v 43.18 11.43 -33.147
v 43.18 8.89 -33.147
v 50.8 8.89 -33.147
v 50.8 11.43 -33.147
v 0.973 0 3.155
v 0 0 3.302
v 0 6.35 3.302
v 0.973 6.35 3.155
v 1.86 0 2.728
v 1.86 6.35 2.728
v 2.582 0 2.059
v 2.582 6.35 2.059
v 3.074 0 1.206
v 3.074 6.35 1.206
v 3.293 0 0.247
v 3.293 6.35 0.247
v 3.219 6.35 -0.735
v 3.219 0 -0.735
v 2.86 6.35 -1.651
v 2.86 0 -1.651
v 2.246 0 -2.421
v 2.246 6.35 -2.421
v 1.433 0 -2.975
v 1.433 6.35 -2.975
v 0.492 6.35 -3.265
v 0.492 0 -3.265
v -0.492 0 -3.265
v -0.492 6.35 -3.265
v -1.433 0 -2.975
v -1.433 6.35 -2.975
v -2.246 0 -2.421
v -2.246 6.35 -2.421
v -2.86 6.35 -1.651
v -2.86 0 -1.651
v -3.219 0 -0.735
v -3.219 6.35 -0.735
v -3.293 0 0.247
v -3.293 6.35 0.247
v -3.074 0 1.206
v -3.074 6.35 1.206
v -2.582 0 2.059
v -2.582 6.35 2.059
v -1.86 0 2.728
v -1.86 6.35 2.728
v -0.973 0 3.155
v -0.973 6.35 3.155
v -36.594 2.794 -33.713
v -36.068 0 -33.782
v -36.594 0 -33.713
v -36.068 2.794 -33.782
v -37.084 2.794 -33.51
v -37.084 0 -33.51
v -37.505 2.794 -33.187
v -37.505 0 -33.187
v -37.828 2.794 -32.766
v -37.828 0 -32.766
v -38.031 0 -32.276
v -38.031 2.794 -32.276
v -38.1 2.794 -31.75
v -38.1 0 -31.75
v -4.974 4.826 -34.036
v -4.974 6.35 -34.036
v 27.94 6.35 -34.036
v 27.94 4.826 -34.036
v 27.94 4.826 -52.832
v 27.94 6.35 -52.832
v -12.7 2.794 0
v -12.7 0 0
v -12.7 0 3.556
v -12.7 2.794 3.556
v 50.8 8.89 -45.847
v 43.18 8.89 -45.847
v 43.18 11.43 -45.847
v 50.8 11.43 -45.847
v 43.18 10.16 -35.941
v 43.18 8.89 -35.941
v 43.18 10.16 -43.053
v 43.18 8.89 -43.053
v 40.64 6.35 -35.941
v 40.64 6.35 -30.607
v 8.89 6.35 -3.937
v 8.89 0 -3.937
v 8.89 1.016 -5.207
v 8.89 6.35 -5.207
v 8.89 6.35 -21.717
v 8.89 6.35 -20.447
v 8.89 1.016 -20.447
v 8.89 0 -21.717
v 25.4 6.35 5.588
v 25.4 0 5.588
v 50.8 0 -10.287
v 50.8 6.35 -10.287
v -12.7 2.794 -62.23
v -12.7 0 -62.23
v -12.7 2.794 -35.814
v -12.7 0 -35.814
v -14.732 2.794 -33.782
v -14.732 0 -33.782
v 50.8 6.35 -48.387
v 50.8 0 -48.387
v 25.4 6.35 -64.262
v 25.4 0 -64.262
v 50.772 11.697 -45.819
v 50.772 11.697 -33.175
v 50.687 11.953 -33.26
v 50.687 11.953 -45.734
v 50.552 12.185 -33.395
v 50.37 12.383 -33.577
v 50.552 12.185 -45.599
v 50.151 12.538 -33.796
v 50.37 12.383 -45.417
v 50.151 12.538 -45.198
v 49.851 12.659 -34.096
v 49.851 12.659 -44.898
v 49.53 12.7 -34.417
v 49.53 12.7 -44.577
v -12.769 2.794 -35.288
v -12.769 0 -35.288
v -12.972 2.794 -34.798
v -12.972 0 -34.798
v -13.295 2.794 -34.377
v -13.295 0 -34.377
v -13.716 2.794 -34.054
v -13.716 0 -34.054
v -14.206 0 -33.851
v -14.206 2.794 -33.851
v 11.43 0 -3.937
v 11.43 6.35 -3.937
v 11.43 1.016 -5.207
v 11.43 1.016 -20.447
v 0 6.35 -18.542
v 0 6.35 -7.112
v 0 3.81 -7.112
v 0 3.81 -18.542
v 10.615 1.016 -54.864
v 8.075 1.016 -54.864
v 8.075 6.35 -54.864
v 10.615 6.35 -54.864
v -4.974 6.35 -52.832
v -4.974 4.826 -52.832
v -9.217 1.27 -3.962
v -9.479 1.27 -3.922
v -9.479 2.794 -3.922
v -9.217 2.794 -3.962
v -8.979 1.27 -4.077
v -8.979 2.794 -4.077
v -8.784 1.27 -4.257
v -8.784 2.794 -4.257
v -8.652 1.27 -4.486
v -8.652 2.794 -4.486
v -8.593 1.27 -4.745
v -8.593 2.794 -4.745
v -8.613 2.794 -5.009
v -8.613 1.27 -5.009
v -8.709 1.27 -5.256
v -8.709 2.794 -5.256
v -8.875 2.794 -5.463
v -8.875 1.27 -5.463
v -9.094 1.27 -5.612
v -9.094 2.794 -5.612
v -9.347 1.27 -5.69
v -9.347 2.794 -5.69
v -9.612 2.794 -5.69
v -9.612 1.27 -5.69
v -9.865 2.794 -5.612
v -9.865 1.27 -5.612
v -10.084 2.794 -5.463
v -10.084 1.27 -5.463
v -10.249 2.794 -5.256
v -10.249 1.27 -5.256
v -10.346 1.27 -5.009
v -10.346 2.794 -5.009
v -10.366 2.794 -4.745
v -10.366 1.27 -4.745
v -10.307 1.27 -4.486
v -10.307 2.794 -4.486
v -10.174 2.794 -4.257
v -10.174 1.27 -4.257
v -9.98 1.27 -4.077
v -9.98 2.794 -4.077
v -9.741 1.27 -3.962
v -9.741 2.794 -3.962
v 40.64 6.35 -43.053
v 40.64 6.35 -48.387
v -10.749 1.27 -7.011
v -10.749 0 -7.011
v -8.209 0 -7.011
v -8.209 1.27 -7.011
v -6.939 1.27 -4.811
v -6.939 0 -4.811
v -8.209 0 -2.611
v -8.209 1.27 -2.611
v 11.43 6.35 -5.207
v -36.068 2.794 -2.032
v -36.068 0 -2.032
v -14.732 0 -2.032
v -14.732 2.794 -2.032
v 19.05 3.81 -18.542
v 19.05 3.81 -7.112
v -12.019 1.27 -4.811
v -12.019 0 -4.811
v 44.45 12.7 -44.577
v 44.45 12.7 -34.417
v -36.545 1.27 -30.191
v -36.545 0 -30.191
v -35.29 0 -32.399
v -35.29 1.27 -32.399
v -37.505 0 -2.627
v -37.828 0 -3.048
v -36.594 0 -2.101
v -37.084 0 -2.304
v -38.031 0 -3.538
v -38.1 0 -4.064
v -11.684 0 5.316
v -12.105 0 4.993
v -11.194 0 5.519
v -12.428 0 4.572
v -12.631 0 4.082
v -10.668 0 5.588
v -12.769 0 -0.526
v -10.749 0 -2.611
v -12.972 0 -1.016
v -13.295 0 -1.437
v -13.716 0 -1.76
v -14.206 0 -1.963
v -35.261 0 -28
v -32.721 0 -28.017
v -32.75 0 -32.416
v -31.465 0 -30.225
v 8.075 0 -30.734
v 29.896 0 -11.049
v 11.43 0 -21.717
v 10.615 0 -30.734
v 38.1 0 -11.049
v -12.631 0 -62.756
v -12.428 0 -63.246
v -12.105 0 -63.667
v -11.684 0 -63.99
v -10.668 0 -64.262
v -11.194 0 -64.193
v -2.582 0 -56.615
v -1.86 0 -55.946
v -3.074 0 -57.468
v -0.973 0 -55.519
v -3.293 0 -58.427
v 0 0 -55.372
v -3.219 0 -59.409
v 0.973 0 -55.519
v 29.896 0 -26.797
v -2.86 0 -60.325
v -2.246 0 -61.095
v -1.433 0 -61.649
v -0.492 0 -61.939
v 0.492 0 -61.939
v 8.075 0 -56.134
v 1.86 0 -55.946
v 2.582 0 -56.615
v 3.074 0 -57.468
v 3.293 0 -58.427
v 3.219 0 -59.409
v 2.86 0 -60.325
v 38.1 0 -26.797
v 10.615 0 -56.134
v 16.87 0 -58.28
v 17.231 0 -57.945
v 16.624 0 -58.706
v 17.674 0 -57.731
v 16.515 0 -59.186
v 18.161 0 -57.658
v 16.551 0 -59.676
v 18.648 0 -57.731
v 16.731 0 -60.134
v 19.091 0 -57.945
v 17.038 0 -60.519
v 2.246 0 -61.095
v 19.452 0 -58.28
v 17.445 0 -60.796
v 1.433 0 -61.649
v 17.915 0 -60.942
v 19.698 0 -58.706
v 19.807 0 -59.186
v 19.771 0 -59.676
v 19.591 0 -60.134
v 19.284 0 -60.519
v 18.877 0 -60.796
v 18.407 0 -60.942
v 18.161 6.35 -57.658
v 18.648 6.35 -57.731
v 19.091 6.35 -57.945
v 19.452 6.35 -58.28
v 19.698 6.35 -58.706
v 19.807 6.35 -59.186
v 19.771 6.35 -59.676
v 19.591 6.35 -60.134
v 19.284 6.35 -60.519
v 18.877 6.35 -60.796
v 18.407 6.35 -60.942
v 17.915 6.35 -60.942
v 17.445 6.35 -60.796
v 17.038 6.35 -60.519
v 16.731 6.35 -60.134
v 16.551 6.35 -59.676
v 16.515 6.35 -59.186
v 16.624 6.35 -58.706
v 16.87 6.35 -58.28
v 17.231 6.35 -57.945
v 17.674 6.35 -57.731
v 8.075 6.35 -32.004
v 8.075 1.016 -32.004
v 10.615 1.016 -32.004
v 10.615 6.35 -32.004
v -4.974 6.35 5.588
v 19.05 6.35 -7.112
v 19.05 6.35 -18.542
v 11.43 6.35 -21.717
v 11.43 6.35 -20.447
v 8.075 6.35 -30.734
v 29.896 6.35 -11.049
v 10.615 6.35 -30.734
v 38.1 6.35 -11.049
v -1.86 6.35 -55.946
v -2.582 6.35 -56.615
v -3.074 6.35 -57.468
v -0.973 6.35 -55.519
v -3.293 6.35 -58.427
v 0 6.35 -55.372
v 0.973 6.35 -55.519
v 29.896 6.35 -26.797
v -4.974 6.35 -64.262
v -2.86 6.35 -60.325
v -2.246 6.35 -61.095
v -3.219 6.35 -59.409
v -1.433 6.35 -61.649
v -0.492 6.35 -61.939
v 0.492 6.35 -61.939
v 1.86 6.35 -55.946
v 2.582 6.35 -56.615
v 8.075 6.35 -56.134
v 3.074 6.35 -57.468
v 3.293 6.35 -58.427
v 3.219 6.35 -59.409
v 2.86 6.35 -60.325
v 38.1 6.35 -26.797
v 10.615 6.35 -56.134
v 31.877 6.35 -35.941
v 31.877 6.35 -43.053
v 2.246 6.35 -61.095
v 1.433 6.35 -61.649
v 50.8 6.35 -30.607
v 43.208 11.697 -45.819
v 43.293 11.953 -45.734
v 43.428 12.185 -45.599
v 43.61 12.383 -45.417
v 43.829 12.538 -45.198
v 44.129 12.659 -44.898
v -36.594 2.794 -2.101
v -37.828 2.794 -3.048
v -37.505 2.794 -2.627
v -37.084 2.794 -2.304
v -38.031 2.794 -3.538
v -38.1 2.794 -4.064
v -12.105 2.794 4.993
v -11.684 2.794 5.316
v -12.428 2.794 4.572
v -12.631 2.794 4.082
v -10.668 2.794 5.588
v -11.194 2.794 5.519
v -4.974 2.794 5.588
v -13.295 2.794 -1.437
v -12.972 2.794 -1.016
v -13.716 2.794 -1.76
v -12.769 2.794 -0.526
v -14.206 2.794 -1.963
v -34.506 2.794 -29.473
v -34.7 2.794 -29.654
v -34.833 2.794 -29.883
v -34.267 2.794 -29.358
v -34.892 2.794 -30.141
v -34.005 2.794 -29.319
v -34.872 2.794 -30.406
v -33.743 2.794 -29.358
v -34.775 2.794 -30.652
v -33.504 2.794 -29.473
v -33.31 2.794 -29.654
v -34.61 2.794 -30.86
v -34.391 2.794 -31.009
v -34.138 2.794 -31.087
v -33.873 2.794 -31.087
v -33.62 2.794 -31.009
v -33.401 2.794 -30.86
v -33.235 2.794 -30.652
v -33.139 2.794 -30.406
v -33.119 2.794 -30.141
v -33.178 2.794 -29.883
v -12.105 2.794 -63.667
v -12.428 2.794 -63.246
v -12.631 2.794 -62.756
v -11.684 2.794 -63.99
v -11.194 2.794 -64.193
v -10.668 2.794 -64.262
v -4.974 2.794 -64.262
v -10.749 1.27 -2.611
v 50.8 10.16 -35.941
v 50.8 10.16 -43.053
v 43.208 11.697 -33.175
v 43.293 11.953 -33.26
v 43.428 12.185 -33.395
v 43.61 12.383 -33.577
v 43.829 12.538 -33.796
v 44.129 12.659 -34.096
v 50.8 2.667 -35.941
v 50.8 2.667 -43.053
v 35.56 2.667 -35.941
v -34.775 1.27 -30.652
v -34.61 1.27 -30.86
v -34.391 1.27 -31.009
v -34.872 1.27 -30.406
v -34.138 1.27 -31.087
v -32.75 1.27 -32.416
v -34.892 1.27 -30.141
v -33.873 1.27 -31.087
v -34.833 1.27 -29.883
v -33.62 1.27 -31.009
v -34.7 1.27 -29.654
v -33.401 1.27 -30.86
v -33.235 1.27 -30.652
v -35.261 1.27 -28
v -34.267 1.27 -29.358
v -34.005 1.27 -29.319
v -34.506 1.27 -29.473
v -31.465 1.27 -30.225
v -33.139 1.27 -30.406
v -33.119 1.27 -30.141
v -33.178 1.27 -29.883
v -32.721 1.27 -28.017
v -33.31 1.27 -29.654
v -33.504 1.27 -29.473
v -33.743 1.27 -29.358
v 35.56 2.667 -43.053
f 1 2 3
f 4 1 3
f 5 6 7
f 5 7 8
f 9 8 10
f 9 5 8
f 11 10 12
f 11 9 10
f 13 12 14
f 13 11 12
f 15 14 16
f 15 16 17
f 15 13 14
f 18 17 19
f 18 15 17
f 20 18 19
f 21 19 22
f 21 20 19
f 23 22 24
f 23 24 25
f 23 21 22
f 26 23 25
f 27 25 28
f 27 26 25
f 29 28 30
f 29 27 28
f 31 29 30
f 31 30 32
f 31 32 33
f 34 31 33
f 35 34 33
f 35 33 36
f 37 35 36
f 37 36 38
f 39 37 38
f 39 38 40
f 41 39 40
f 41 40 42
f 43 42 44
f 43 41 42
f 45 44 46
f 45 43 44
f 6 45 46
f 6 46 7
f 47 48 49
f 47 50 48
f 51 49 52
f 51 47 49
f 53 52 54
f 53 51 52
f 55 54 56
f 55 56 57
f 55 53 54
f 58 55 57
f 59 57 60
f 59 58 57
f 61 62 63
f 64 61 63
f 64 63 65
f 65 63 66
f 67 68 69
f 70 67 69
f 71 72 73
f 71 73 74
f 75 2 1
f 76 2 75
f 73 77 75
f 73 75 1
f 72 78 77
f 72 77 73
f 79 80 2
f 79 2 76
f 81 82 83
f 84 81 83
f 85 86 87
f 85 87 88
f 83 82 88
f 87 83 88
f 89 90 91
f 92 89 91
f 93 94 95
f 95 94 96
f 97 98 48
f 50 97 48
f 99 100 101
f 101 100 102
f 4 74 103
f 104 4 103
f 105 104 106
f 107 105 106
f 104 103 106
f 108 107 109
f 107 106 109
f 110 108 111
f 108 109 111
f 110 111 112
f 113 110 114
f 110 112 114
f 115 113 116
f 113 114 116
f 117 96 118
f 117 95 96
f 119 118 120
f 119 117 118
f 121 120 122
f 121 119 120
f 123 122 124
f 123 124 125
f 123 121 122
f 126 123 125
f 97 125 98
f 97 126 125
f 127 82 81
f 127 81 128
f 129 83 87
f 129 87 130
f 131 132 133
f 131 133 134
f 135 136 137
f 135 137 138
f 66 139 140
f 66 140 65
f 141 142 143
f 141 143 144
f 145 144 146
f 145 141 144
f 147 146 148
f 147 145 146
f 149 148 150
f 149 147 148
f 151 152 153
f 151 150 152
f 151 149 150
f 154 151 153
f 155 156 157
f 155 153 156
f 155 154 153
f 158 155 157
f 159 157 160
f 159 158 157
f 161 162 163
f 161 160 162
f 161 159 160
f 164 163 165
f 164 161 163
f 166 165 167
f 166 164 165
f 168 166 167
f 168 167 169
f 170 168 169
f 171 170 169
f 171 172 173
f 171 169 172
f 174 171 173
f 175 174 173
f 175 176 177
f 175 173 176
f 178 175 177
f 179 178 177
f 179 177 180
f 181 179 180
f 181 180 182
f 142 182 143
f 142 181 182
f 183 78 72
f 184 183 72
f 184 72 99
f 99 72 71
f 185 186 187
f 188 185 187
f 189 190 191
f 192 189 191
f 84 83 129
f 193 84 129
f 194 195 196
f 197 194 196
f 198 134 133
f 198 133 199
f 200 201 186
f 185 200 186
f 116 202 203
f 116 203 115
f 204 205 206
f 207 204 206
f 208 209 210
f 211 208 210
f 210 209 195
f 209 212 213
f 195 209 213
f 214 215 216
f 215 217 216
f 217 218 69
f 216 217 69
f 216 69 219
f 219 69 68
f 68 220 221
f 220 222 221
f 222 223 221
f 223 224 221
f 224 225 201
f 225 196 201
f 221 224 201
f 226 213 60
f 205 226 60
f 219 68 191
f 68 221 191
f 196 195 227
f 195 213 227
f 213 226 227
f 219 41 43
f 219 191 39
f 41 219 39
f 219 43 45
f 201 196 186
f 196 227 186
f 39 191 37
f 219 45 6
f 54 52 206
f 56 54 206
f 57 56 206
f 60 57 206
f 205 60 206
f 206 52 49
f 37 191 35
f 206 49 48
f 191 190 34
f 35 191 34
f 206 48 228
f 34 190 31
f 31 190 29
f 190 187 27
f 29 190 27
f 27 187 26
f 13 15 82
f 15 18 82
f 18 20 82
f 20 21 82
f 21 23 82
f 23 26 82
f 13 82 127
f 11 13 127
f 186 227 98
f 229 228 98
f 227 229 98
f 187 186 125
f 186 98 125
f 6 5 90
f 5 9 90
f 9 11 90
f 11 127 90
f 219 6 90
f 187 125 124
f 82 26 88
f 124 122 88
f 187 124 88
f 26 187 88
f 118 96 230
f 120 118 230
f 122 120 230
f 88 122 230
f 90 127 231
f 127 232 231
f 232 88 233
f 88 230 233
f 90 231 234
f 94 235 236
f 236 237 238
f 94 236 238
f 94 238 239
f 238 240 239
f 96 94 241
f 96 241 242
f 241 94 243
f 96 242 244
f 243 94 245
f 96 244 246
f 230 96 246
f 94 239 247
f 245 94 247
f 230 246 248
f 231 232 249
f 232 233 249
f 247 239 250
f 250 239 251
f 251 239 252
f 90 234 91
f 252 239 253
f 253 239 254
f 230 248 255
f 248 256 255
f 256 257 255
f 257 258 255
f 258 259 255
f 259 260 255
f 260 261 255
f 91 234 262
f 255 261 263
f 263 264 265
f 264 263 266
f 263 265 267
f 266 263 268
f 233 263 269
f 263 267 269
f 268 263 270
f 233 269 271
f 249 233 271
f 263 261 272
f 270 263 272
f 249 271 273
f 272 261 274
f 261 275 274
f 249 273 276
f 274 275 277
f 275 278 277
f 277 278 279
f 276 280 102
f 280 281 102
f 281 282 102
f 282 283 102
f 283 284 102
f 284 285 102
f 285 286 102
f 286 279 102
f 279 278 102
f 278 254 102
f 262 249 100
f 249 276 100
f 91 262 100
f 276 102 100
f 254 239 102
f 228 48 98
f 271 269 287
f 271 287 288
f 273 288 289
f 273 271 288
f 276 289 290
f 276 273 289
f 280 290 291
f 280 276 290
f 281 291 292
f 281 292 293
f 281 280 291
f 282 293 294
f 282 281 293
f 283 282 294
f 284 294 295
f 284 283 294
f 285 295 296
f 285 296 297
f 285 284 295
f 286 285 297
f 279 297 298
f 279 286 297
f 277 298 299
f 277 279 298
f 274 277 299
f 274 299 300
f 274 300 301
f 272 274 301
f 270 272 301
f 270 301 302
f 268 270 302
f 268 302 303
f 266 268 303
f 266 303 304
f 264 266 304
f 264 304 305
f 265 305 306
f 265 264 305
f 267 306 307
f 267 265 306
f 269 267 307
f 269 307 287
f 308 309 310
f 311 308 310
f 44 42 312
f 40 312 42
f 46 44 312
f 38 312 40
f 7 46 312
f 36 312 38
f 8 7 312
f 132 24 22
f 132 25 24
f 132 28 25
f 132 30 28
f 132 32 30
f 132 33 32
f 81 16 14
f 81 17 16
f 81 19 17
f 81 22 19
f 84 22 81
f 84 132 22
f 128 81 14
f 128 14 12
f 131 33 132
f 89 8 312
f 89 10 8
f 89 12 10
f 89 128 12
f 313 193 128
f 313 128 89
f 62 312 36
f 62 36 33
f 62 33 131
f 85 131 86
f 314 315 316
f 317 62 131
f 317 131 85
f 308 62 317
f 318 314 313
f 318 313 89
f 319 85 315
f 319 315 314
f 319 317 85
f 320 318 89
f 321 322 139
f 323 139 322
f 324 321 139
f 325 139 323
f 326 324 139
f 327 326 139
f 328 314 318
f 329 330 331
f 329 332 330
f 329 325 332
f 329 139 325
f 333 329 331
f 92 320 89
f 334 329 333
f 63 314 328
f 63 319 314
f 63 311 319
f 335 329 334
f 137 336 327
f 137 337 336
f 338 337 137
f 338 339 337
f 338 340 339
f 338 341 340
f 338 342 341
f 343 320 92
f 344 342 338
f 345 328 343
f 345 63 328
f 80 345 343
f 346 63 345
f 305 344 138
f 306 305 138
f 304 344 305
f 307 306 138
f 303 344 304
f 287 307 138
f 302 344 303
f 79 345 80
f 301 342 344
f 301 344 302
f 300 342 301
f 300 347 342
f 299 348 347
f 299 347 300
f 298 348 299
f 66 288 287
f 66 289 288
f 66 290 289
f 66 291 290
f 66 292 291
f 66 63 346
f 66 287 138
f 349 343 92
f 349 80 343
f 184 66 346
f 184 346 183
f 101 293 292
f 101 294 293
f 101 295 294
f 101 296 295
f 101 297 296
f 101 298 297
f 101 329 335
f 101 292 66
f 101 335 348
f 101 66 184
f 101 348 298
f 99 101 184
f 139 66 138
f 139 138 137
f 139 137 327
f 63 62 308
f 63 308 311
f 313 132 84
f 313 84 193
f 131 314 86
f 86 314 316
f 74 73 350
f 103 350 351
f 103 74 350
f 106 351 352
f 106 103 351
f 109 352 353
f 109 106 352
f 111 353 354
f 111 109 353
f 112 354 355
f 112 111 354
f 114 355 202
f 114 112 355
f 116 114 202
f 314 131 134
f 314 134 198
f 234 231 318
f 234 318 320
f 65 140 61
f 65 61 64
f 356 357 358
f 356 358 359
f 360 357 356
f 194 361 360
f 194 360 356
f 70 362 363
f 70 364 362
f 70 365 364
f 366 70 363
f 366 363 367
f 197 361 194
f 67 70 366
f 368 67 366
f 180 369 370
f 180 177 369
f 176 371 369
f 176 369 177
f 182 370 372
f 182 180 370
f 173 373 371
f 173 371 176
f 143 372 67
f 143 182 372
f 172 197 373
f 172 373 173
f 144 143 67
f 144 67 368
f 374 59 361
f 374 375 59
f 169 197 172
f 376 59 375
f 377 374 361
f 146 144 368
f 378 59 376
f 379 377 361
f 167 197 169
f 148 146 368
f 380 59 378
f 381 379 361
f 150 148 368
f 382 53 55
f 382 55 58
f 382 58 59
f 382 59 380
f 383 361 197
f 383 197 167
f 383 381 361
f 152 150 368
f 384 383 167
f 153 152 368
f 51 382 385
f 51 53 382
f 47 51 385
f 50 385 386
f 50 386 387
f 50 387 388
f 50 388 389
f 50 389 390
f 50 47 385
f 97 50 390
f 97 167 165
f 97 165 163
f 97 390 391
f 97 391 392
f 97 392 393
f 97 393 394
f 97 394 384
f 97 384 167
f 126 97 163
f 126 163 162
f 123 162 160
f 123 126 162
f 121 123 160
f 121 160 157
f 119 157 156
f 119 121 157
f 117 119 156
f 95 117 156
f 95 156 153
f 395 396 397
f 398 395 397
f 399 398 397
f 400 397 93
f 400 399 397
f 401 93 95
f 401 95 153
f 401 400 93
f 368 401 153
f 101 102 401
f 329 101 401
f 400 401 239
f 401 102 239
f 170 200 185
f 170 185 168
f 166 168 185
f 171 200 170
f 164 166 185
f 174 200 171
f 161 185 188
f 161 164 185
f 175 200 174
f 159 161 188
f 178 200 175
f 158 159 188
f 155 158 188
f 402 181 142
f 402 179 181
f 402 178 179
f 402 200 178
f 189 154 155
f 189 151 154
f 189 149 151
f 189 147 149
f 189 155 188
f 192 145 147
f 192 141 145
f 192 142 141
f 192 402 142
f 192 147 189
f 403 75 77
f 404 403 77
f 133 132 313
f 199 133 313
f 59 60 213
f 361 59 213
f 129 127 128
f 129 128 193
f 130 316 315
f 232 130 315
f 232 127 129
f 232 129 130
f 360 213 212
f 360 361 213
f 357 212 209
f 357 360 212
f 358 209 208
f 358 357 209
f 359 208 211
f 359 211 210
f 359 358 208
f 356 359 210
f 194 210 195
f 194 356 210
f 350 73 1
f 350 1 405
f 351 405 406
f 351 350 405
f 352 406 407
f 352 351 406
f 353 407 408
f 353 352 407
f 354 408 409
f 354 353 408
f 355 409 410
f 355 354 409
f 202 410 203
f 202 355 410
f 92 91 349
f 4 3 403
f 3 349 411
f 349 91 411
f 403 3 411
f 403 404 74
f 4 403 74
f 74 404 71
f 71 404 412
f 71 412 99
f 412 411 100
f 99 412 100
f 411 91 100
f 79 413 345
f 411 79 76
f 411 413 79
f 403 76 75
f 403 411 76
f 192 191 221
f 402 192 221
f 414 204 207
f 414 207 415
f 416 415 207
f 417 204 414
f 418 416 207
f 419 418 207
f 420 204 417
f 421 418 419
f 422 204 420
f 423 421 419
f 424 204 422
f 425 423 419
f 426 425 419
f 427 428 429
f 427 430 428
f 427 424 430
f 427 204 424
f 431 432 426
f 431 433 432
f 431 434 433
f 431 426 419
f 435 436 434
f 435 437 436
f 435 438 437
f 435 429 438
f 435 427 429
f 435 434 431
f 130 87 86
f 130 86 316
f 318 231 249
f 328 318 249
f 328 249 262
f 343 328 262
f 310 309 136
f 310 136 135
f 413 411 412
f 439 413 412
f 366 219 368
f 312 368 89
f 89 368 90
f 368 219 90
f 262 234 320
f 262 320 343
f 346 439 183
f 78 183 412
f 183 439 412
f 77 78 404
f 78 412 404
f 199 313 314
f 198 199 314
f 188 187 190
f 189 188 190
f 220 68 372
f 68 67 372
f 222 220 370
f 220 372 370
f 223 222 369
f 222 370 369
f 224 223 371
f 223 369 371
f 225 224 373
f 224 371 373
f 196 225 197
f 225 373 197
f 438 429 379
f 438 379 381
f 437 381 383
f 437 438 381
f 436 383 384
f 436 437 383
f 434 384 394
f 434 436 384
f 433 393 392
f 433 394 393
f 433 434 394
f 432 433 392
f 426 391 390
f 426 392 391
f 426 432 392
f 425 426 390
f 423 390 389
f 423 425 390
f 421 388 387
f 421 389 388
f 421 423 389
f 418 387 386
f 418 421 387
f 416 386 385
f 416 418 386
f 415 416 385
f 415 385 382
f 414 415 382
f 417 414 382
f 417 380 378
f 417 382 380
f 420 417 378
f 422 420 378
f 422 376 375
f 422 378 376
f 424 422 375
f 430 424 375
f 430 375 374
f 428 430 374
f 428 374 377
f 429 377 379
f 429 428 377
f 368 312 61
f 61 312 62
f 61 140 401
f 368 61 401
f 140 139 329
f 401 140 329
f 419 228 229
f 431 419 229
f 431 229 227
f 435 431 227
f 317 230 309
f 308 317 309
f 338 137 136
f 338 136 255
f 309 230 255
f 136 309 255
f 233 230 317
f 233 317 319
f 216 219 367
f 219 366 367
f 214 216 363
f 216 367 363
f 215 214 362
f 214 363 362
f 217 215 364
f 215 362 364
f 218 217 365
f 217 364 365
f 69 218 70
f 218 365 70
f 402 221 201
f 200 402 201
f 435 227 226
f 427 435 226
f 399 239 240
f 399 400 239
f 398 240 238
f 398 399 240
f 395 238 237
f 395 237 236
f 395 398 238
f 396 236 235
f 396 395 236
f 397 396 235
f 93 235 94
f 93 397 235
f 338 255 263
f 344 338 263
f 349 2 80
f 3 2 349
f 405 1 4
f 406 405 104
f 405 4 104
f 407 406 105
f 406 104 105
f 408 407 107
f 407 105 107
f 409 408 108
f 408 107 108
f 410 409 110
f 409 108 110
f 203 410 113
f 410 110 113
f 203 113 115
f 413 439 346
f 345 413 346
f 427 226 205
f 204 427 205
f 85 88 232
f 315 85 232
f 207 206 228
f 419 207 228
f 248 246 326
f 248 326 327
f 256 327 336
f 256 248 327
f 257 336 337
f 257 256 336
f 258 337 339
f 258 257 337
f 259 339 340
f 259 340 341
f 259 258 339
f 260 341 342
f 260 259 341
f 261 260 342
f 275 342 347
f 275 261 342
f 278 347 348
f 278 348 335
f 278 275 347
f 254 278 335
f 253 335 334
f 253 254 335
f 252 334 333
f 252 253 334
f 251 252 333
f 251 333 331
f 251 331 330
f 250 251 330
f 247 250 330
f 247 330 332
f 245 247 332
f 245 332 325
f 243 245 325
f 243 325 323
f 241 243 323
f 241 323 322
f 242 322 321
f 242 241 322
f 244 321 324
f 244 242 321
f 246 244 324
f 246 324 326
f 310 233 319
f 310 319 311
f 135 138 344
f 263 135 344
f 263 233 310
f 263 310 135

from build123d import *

# Parameters (mm, degrees)
SKETCH1_R               = 1.651
SKETCH1_R_2             = 3.302
SKETCH1_R_3             = 0.889
SKETCH1_W               = 8.2042
SKETCH1_H               = 15.748
BOSS_EXTRUDE1_DEPTH     = 6.35
SKETCH2_W               = 19.05
SKETCH2_H               = 11.43
CUT_EXTRUDE1_DEPTH      = 2.54
CUT_EXTRUDE2_DEPTH      = 83.161835082
CUT_EXTRUDE2_DEPTH_BACK = 83.161835082
SKETCH5_W               = 2.54
SKETCH5_H               = 1.27
SKETCH6_W               = 2.54
SKETCH6_H               = 15.24
CUT_EXTRUDE3_DEPTH      = 1.016
SKETCH7_W               = 40.64
SKETCH7_H               = 18.796
CUT_EXTRUDE4_DEPTH      = 1.524
CUT_EXTRUDE5_DEPTH      = 83.161835082
CUT_EXTRUDE5_DEPTH_BACK = 83.161835082
SKETCH8_W               = 2.54
SKETCH8_H               = 1.27
SKETCH10_W              = 2.54
SKETCH10_H              = 22.86
CUT_EXTRUDE6_DEPTH      = 1.016
SKETCH11_W              = 7.62
SKETCH11_H              = 12.7
BOSS_EXTRUDE2_DEPTH     = 6.35
SKETCH13_W              = 7.112
SKETCH13_H              = 7.493
CUT_EXTRUDE7_DEPTH      = 19.05
CHAMFER3_SIZE           = 2.54
FILLET1_R               = 1.27
CHAMFER4_SIZE           = 3.81
SKETCH14_W              = 33.125812981
SKETCH14_H              = 69.85
CUT_EXTRUDE8_DEPTH      = 3.556
FILLET2_R               = 2.032
CUT_EXTRUDE9_DEPTH      = 1.27


with BuildPart() as part:
    # Sketch1 → Boss-Extrude1 (new body)
    with BuildSketch(Plane(origin=(0, 0, 0), x_dir=(1, 0, 0), z_dir=(0, 1, 0))):
        Polygon((25.4, 64.262), (-12.7, 64.262), (-12.7, 33.782), (-38.1, 33.782), (-38.1, 2.032), (-12.7, 2.032), (-12.7, -5.588), (25.4, -5.588), (50.8, 10.287), (50.8, 48.387), align=None)
        with Locations(Location((18.161, 59.309, 0), (0, 0, 270))):
            Circle(SKETCH1_R, mode=Mode.SUBTRACT)
        with Locations(Location((0, 0, 0), (0, 0, 270))):
            Circle(SKETCH1_R_2, mode=Mode.SUBTRACT)
        with Locations(Location((-9.47933438, 4.811158086, 0), (0, 0, 270))):
            Circle(SKETCH1_R_3, mode=Mode.SUBTRACT)
        with Locations(Location((0, 58.674, 0), (0, 0, 270))):
            Circle(SKETCH1_R_2, mode=Mode.SUBTRACT)
        with Locations((33.9979, 18.923)):
            Rectangle(SKETCH1_W, SKETCH1_H, mode=Mode.SUBTRACT)
        with Locations(Location((-34.005247297, 30.20787503, 0), (0, 0, 270))):
            Circle(SKETCH1_R_3, mode=Mode.SUBTRACT)
    extrude(amount=BOSS_EXTRUDE1_DEPTH)

    # Sketch2 → Cut-Extrude1 (cut)
    with BuildSketch(Plane(origin=(0, 6.35, 0), x_dir=(1, 0, 0), z_dir=(0, 1, 0))):
        with Locations((9.525, 12.827)):
            Rectangle(SKETCH2_W, SKETCH2_H)
    extrude(amount=-CUT_EXTRUDE1_DEPTH, mode=Mode.SUBTRACT)

    # Sketch5 → Cut-Extrude2 (cut, two sides: drawn at the far end of the back side and taken through both)
    with BuildSketch(Plane(origin=(0, 6.35, 0), x_dir=(1, 0, 0), z_dir=(0, 1, 0)).offset(-CUT_EXTRUDE2_DEPTH_BACK)):
        with Locations((10.16, 21.082)):
            Rectangle(SKETCH5_W, SKETCH5_H)
        with Locations((10.16, 4.572)):
            Rectangle(SKETCH5_W, SKETCH5_H)
    extrude(amount=CUT_EXTRUDE2_DEPTH + CUT_EXTRUDE2_DEPTH_BACK, mode=Mode.SUBTRACT)

    # Sketch6 → Cut-Extrude3 (cut)
    with BuildSketch(Plane.XZ):
        with Locations((10.16, -12.827)):
            Rectangle(SKETCH6_W, SKETCH6_H)
    extrude(amount=-CUT_EXTRUDE3_DEPTH, mode=Mode.SUBTRACT)

    # Sketch7 → Cut-Extrude4 (cut)
    with BuildSketch(Plane(origin=(0, 6.35, 0), x_dir=(1, 0, 0), z_dir=(0, 1, 0))):
        with Locations((7.62, 43.434)):
            Rectangle(SKETCH7_W, SKETCH7_H)
    extrude(amount=-CUT_EXTRUDE4_DEPTH, mode=Mode.SUBTRACT)

    # Sketch8 → Cut-Extrude5 (cut, two sides: drawn at the far end of the back side and taken through both)
    with BuildSketch(Plane(origin=(0, 6.35, 0), x_dir=(1, 0, 0), z_dir=(0, 1, 0)).offset(-CUT_EXTRUDE5_DEPTH_BACK)):
        with Locations((9.344785272, 55.499)):
            Rectangle(SKETCH8_W, SKETCH8_H)
        with Locations((9.344785272, 31.369)):
            Rectangle(SKETCH8_W, SKETCH8_H)
    extrude(amount=CUT_EXTRUDE5_DEPTH + CUT_EXTRUDE5_DEPTH_BACK, mode=Mode.SUBTRACT)

    # Sketch10 → Cut-Extrude6 (cut)
    with BuildSketch(Plane.XZ):
        with Locations((9.344785272, -43.434)):
            Rectangle(SKETCH10_W, SKETCH10_H)
    extrude(amount=-CUT_EXTRUDE6_DEPTH, mode=Mode.SUBTRACT)

    # Sketch11 → Boss-Extrude2 (add)
    with BuildSketch(Plane(origin=(0, 6.35, 0), x_dir=(1, 0, 0), z_dir=(0, 1, 0))):
        with Locations((46.99, 39.497)):
            Rectangle(SKETCH11_W, SKETCH11_H)
    extrude(amount=BOSS_EXTRUDE2_DEPTH)

    # Sketch13 → Cut-Extrude7 (cut)
    with BuildSketch(Plane(origin=(50.8, 0, 0), x_dir=(0, 0, -1), z_dir=(1, 0, 0))):
        with Locations((39.497, 6.4135)):
            Rectangle(SKETCH13_W, SKETCH13_H)
    extrude(amount=-CUT_EXTRUDE7_DEPTH, mode=Mode.SUBTRACT)

    # Chamfer3
    chamfer3_edges = [part.edges().sort_by_distance(p)[0] for p in [
        (46.99, 6.35, -45.847),
        (43.18, 6.35, -44.45),
        (46.99, 6.35, -33.147),
        (43.18, 6.35, -34.544),
    ]]
    chamfer(chamfer3_edges, length=CHAMFER3_SIZE)

    # Fillet1
    fillet1_edges = [part.edges().sort_by_distance(p)[0] for p in [
        (50.8, 12.7, -39.497),
        (46.99, 12.7, -45.847),
        (43.18, 12.7, -39.497),
        (46.99, 12.7, -33.147),
    ]]
    fillet(fillet1_edges, radius=FILLET1_R)

    # Chamfer4
    # the kernel refuses this chamfer: 3.81 mm, written as the material it adds along each edge
    with BuildSketch(Plane(origin=(31.75, 2.667, -52.851112184), x_dir=(0.9996219169112968, -0.027495876610586386, 0), z_dir=(0, 0, 1))) as chamfer4_piece_1_section:
        Polygon((CHAMFER4_SIZE * 0.999621916911, CHAMFER4_SIZE * 0.0274958766106), (-CHAMFER4_SIZE * 0.0274958766106, CHAMFER4_SIZE * 0.999621916911), (0, 0), align=None)
    chamfer4_piece_1 = extrude(amount=26.708224368, mode=Mode.PRIVATE)
    chamfer4_piece_1 = split(chamfer4_piece_1, bisect_by=Plane(origin=(33.021365591, 6.35, -39.497), z_dir=(0, -1, 0)), keep=Keep.TOP, mode=Mode.PRIVATE)
    chamfer4_piece_1 = split(chamfer4_piece_1, bisect_by=Plane(origin=(33.021365591, 3.934268817, -26.797), z_dir=(0, 0, -1)), keep=Keep.TOP, mode=Mode.PRIVATE)
    add(chamfer4_piece_1)

    # Sketch14 → Cut-Extrude8 (cut)
    with BuildSketch(Plane(origin=(0, 6.35, 0), x_dir=(1, 0, 0), z_dir=(0, 1, 0))):
        with Locations((-21.53709351, 29.337)):
            Rectangle(SKETCH14_W, SKETCH14_H)
    extrude(amount=-CUT_EXTRUDE8_DEPTH, mode=Mode.SUBTRACT)

    # Fillet2
    fillet2_edges = [part.edges().sort_by_distance(p)[0] for p in [
        (-38.1, 1.397, -33.782),
        (-12.7, 1.397, -33.782),
        (-12.7, 1.397, -2.032),
        (-38.1, 1.397, -2.032),
        (-12.7, 1.397, -64.262),
        (-12.7, 1.397, 5.588),
    ]]
    fillet(fillet2_edges, radius=FILLET2_R)

    # Sketch16 → Cut-Extrude9 (cut)
    with BuildSketch(Plane.XZ):
        Polygon((-10.74933438, -7.010862612), (-8.20933438, -7.010862612), (-6.93933438, -4.811158086), (-8.20933438, -2.61145356), (-10.74933438, -2.61145356), (-12.01933438, -4.811158086), align=None)
        Polygon((-32.74988098, -32.415963663), (-31.465303289, -30.224740225), (-32.720669607, -28.016651592), (-35.260613615, -27.999786398), (-36.545191306, -30.191009836), (-35.289824988, -32.399098469), align=None)
    extrude(amount=-CUT_EXTRUDE9_DEPTH, mode=Mode.SUBTRACT)


solid = part.part
